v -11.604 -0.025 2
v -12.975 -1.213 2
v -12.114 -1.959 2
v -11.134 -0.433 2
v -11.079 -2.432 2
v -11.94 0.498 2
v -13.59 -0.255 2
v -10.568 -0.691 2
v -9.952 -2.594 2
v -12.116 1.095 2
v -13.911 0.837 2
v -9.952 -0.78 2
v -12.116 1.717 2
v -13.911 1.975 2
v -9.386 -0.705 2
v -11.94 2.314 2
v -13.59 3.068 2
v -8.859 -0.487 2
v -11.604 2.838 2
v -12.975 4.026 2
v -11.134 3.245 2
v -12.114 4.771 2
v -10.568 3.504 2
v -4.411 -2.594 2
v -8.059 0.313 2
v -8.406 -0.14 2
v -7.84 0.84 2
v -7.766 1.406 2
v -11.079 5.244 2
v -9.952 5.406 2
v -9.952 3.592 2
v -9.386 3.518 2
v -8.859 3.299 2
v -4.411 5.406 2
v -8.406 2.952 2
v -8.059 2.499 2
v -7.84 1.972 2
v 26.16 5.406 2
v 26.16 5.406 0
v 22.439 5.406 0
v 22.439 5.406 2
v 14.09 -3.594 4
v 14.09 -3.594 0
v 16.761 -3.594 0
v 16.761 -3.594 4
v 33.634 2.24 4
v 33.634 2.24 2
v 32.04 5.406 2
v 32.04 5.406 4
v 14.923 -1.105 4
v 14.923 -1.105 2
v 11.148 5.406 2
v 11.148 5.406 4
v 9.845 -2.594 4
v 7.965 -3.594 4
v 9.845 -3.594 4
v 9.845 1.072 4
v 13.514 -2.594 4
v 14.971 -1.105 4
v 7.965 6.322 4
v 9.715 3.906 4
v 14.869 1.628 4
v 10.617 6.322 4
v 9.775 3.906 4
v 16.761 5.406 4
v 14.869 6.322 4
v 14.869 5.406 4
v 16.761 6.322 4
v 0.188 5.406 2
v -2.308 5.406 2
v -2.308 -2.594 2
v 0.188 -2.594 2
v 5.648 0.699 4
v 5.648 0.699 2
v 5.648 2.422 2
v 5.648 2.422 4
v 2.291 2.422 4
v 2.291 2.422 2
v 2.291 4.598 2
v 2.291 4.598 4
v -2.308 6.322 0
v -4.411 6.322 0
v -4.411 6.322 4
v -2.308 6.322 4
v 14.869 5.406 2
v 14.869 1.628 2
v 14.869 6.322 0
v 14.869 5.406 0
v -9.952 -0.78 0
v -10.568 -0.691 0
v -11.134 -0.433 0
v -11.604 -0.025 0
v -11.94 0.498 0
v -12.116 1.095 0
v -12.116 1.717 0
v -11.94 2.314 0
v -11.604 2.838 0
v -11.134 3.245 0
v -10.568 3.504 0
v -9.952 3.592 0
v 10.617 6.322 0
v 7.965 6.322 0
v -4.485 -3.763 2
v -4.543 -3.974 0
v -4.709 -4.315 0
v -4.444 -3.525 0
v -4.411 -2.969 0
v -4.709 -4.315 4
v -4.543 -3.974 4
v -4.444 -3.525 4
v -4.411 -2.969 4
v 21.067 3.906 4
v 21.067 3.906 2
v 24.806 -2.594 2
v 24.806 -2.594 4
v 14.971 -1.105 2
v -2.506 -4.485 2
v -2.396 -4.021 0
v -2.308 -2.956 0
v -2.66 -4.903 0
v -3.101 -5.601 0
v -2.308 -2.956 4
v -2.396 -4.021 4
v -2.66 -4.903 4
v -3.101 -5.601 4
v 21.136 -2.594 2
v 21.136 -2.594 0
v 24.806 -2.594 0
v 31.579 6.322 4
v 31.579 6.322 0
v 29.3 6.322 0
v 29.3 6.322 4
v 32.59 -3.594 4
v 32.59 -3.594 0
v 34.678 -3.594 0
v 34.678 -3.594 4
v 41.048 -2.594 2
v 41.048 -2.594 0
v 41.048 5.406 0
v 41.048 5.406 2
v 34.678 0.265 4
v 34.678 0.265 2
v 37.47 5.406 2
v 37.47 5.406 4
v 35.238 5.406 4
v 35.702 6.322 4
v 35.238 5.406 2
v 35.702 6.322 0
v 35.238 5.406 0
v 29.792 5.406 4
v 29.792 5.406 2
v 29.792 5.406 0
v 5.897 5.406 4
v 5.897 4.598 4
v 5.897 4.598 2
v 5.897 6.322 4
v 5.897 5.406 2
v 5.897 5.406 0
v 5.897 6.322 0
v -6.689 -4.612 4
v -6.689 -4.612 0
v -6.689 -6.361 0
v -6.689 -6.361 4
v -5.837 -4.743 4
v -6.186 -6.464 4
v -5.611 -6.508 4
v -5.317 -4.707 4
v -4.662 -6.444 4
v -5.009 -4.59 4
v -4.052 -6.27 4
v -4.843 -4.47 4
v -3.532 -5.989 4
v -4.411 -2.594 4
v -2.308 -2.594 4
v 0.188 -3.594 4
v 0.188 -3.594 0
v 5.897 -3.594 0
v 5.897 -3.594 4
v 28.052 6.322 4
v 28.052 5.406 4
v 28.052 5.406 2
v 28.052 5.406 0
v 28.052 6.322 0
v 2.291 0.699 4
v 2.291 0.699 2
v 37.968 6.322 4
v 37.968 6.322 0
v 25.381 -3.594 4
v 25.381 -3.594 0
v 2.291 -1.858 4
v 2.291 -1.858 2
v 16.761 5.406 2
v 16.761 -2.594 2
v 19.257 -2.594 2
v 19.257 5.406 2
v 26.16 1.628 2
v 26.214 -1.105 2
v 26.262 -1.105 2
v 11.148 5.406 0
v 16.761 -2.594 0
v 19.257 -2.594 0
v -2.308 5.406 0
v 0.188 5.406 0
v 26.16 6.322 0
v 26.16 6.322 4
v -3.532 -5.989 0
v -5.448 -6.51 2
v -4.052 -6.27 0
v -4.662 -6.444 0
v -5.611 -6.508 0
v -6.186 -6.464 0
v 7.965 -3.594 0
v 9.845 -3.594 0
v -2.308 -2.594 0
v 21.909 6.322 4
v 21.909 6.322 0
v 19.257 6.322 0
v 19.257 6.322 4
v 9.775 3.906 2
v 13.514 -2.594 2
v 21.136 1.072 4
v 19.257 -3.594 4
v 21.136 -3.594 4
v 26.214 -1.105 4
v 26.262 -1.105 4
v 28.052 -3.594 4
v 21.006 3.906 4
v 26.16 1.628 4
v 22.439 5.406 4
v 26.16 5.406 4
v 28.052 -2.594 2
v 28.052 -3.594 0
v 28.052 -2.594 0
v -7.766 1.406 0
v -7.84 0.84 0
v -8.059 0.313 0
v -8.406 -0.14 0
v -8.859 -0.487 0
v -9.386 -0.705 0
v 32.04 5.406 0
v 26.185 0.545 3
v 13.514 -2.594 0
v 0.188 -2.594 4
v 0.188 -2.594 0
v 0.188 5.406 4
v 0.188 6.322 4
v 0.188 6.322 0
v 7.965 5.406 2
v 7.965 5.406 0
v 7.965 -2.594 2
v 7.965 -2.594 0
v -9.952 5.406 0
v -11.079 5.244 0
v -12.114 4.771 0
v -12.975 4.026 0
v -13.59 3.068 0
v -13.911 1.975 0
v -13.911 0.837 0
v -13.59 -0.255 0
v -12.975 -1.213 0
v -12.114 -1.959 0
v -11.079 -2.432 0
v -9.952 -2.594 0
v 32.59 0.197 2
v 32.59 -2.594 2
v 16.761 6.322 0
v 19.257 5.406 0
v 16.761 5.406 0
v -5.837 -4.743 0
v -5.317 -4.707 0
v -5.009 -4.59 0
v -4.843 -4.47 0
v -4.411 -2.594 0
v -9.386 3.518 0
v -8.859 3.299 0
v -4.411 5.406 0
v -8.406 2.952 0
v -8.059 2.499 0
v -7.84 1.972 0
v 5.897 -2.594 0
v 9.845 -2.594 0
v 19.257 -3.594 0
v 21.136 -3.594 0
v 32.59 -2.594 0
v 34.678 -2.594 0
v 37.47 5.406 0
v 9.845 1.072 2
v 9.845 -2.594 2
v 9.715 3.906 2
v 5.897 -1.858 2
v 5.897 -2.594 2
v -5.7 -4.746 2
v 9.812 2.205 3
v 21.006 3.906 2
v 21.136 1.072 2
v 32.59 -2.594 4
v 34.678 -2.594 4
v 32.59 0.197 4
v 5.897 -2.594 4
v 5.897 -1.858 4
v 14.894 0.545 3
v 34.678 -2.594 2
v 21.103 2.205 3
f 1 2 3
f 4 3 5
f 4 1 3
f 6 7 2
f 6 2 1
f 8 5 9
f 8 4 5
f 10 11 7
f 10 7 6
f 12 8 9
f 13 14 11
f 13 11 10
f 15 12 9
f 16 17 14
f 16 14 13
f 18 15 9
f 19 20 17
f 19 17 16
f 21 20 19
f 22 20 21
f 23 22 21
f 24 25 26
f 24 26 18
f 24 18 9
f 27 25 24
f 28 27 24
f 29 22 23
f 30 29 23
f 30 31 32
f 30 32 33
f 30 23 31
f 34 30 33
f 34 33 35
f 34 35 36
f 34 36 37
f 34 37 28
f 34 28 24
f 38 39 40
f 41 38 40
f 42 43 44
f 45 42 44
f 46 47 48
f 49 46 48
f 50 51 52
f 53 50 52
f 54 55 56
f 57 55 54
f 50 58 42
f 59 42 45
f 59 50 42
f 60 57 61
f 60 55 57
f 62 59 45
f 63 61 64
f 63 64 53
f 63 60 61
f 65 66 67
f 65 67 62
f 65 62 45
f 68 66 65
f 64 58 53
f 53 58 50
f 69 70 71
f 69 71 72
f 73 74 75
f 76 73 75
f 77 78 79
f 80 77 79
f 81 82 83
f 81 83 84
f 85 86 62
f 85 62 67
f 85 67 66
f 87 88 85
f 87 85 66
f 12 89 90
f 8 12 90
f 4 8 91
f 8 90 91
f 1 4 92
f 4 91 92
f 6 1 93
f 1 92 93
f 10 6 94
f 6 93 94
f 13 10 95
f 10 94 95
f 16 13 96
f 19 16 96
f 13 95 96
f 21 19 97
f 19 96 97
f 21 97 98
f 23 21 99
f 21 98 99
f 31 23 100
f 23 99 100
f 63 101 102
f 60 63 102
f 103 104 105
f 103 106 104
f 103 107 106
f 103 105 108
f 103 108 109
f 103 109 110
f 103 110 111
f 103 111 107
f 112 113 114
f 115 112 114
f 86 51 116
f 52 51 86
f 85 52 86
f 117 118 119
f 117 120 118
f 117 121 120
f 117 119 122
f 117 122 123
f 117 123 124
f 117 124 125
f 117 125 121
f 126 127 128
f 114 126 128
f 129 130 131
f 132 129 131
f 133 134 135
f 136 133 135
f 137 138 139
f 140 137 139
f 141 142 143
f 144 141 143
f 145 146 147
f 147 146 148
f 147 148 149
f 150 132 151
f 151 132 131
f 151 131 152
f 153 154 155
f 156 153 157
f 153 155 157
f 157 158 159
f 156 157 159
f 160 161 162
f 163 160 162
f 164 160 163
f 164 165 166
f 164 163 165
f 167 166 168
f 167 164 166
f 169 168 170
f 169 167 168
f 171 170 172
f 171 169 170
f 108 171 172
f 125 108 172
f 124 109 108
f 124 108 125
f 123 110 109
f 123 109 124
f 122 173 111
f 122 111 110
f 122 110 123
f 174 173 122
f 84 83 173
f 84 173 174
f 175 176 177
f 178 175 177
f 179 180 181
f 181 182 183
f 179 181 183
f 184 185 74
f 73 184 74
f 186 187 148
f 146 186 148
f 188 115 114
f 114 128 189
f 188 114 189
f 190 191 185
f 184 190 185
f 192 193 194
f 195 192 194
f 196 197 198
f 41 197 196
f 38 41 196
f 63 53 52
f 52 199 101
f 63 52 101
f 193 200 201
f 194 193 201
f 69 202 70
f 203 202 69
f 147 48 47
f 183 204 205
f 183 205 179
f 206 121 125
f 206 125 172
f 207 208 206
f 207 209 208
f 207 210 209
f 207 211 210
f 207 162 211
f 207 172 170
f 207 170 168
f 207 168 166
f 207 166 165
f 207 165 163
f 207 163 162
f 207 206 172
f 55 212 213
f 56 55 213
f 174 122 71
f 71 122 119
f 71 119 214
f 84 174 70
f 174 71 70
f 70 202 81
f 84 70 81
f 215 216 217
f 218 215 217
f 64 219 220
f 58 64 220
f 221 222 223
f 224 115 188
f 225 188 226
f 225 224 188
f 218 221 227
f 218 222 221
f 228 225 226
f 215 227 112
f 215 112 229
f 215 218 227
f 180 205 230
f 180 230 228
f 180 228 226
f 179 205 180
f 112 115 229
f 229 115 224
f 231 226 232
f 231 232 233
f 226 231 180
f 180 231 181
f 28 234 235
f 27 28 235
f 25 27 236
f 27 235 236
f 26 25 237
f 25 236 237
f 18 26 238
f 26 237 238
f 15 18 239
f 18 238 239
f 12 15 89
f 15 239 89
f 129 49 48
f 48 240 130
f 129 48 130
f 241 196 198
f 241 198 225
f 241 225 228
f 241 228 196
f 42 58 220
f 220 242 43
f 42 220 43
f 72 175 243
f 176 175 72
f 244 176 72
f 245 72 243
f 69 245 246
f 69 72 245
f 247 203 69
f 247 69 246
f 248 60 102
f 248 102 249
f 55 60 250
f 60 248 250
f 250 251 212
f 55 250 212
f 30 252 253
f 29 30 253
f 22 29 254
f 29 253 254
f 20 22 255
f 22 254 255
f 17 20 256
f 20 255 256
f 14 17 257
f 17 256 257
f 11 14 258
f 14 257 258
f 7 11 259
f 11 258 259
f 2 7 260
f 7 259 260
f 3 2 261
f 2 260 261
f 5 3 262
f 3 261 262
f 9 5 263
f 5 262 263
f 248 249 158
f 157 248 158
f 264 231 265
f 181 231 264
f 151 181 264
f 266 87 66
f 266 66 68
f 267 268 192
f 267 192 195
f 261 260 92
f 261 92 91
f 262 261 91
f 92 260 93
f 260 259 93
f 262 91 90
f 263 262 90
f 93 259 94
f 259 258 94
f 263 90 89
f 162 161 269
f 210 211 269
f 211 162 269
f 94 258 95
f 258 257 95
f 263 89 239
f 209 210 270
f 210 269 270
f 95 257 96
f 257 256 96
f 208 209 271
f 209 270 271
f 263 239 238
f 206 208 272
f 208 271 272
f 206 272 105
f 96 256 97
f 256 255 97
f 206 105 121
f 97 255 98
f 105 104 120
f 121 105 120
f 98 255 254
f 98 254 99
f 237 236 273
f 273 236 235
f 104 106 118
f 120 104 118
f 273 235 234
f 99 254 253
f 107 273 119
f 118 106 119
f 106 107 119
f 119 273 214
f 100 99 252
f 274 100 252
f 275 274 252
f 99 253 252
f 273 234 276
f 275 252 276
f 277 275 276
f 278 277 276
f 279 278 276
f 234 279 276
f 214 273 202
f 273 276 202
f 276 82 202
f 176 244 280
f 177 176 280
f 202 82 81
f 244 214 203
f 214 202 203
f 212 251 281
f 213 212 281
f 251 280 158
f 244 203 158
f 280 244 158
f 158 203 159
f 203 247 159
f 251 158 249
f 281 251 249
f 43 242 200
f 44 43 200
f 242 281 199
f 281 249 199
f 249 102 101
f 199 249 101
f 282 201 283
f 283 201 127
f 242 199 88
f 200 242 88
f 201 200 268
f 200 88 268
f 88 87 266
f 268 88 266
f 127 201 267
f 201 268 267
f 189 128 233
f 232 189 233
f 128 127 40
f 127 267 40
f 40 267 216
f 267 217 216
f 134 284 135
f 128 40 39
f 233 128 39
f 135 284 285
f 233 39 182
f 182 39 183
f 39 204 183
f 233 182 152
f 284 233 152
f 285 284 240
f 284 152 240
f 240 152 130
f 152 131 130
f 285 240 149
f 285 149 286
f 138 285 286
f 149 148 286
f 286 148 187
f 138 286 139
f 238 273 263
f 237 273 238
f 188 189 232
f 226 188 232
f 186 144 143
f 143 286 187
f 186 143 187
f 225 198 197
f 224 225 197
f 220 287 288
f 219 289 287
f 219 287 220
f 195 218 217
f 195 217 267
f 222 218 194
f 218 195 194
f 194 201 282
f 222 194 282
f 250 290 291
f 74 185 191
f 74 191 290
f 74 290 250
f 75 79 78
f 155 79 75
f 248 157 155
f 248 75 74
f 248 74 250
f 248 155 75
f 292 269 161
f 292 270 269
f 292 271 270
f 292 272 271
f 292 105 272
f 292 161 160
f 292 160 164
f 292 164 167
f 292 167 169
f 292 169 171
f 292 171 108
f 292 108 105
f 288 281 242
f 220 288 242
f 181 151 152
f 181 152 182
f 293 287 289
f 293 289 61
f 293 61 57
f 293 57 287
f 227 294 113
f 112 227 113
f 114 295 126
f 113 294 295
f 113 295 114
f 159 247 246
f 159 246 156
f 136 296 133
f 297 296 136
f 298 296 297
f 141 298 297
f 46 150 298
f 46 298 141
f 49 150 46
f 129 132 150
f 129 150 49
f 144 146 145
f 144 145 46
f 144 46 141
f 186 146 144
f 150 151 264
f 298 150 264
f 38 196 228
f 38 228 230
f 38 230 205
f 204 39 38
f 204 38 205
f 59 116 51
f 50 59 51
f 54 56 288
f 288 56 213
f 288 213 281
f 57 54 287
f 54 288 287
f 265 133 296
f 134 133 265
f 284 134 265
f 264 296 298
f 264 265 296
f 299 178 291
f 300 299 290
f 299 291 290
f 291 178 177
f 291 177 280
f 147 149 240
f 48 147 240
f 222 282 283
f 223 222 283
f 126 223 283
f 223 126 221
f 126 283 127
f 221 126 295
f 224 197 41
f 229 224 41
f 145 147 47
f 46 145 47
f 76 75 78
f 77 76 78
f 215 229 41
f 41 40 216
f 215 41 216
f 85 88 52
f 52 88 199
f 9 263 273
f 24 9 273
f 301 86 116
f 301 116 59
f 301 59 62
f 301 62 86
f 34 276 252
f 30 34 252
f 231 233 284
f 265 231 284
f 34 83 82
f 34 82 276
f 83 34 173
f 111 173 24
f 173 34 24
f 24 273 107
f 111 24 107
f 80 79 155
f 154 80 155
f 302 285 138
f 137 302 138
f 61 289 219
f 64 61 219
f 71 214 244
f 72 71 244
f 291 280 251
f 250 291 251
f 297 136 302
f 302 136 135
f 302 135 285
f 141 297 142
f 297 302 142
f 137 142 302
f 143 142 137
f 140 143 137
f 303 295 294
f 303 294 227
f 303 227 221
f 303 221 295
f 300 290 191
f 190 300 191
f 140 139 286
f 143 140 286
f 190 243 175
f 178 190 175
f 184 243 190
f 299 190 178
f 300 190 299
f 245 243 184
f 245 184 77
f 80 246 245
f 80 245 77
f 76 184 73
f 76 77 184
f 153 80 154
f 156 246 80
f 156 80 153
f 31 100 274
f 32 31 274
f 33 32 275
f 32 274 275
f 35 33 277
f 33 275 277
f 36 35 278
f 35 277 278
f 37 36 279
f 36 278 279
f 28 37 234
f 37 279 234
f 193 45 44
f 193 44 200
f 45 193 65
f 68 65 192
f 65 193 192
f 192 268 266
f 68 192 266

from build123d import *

# Parameters (mm, degrees)
F0_W     = 2.1028645833
F0_H     = 8
F0_H_2   = 0.9153645833
F1_DEPTH = 4
F0_W_2   = 5.7096354167
F0_H_3   = 1
F0_W_3   = 1.8793402778
F0_W_4   = 1.8923611111
F0_W_5   = 2.0876736111
F0_W_6   = 2.4956597222
F2_DEPTH = 2


with BuildPart() as f1:
    # F0 (on Top) → F1 (new body)
    with BuildSketch(Plane.XY):
        with Locations((-3.3594036534, 1.4062102847)):
            Rectangle(F0_W, F0_H)
        with Locations((-3.3594036534, 5.8638925763)):
            Rectangle(F0_W, F0_H_2)
        with BuildLine():
            Line((-2.3079713617, -2.5937897153), (-4.4108359451, -2.5937897153))
            Line((-4.4108359451, -2.5937897153), (-4.4108359451, -2.9687897153))
            add(Edge.make_bspline(
                [(-4.7092300423, -4.3153608959), (-4.4108359451, -3.8845883264), (-4.4108359451, -2.9687897153)],
                knots=[0, 0, 0, 1, 1, 1], degree=2))
            add(Edge.make_bspline(
                [(-5.6998984451, -4.7461334653), (-5.0076241395, -4.7461334653), (-4.7092300423, -4.3153608959)],
                knots=[0, 0, 0, 1, 1, 1], degree=2))
            add(Edge.make_bspline(
                [(-6.6894817784, -4.6115848542), (-6.1469470562, -4.7461334653), (-5.6998984451, -4.7461334653)],
                knots=[0, 0, 0, 1, 1, 1], degree=2))
            Line((-6.6894817784, -4.6115848542), (-6.6894817784, -6.3607167987))
            add(Edge.make_bspline(
                [(-5.448162334, -6.510456382), (-6.1599678895, -6.510456382), (-6.6894817784, -6.3607167987)],
                knots=[0, 0, 0, 1, 1, 1], degree=2))
            add(Edge.make_bspline(
                [(-3.1011571256, -5.6011681875), (-3.8943428895, -6.510456382), (-5.448162334, -6.510456382)],
                knots=[0, 0, 0, 1, 1, 1], degree=2))
            add(Edge.make_bspline(
                [(-2.3079713617, -2.955768882), (-2.3079713617, -4.6918799931), (-3.1011571256, -5.6011681875)],
                knots=[0, 0, 0, 1, 1, 1], degree=2))
            Line((-2.3079713617, -2.955768882), (-2.3079713617, -2.5937897153))
        make_face()
    extrude(amount=F1_DEPTH)



with BuildPart() as f1b:
    # F0 (on Top) → F1, piece 2 (new body)
    with BuildSketch(Plane.XY):
        with Locations((3.0425060688, -3.0937897153)):
            Rectangle(F0_W_2, F0_H_3)
        Polygon((5.8973237772, 5.4062102847), (0.1876883605, 5.4062102847), (0.1876883605, -2.5937897153), (5.8973237772, -2.5937897153), (5.8973237772, -1.8576786042), (2.2905529438, -1.8576786042), (2.2905529438, 0.6987450069), (5.6477578049, 0.6987450069), (5.6477578049, 2.4218352847), (2.2905529438, 2.4218352847), (2.2905529438, 4.5984845902), (5.8973237772, 4.5984845902), align=None)
        with Locations((3.0425060688, 5.8638925763)):
            Rectangle(F0_W_2, F0_H_2)
    extrude(amount=F1_DEPTH)


with BuildPart() as f1c:
    # F0 (on Top) → F1, piece 3 (new body)
    with BuildSketch(Plane.XY):
        Polygon((7.9654661383, 6.321574868), (7.9654661383, 5.4062102847), (11.1480840234, 5.4062102847), (10.6173758605, 6.321574868), align=None)
        with BuildLine():
            Line((11.1480840234, 5.4062102847), (7.9654661383, 5.4062102847))
            Line((7.9654661383, 5.4062102847), (7.9654661383, -2.5937897153))
            Line((7.9654661383, -2.5937897153), (9.844806416, -2.5937897153))
            Line((9.844806416, -2.5937897153), (9.844806416, 1.0720088958))
            add(Edge.make_bspline(
                [(9.7145980827, 3.9062102847), (9.844806416, 1.9205332013), (9.844806416, 1.0720088958)],
                knots=[0, 0, 0, 1, 1, 1], degree=2))
            Line((9.7145980827, 3.9062102847), (9.7753619716, 3.9062102847))
            Line((9.7753619716, 3.9062102847), (13.5143666012, -2.5937897153))
            Line((13.5143666012, -2.5937897153), (16.7610390549, -2.5937897153))
            Line((16.7610390549, -2.5937897153), (16.7610390549, 5.4062102847))
            Line((16.7610390549, 5.4062102847), (14.8686779438, 5.4062102847))
            Line((14.8686779438, 5.4062102847), (14.8686779438, 1.6275644513))
            add(Edge.make_bspline(
                [(14.9706744716, -1.1046404098), (14.8686779438, 0.8289533402), (14.8686779438, 1.6275644513)],
                knots=[0, 0, 0, 1, 1, 1], degree=2))
            Line((14.9706744716, -1.1046404098), (14.922931416, -1.1046404098))
            Line((14.922931416, -1.1046404098), (11.1480840234, 5.4062102847))
        make_face()
        with Locations((8.9051362772, -3.0937897153)):
            Rectangle(F0_W_3, F0_H_3)
        Polygon((16.7610390549, -2.5937897153), (13.5143666012, -2.5937897153), (14.0895980827, -3.5937897153), (16.7610390549, -3.5937897153), align=None)
        with Locations((15.8148584994, 5.8638925763)):
            Rectangle(F0_W_4, F0_H_2)
    extrude(amount=F1_DEPTH)


with BuildPart() as f1d:
    # F0 (on Top) → F1, piece 4 (new body)
    with BuildSketch(Plane.XY):
        Polygon((19.2566987772, 6.321574868), (19.2566987772, 5.4062102847), (22.4393166622, 5.4062102847), (21.9086084994, 6.321574868), align=None)
        with BuildLine():
            Line((22.4393166622, 5.4062102847), (19.2566987772, 5.4062102847))
            Line((19.2566987772, 5.4062102847), (19.2566987772, -2.5937897153))
            Line((19.2566987772, -2.5937897153), (21.1360390549, -2.5937897153))
            Line((21.1360390549, -2.5937897153), (21.1360390549, 1.0720088958))
            add(Edge.make_bspline(
                [(21.0058307216, 3.9062102847), (21.1360390549, 1.9205332013), (21.1360390549, 1.0720088958)],
                knots=[0, 0, 0, 1, 1, 1], degree=2))
            Line((21.0058307216, 3.9062102847), (21.0665946105, 3.9062102847))
            Line((21.0665946105, 3.9062102847), (24.8055992401, -2.5937897153))
            Line((24.8055992401, -2.5937897153), (28.0522716938, -2.5937897153))
            Line((28.0522716938, -2.5937897153), (28.0522716938, 5.4062102847))
            Line((28.0522716938, 5.4062102847), (26.1599105827, 5.4062102847))
            Line((26.1599105827, 5.4062102847), (26.1599105827, 1.6275644513))
            add(Edge.make_bspline(
                [(26.2619071105, -1.1046404098), (26.1599105827, 0.8289533402), (26.1599105827, 1.6275644513)],
                knots=[0, 0, 0, 1, 1, 1], degree=2))
            Line((26.2619071105, -1.1046404098), (26.2141640549, -1.1046404098))
            Line((26.2141640549, -1.1046404098), (22.4393166622, 5.4062102847))
        make_face()
        with Locations((27.1060911383, 5.8638925763)):
            Rectangle(F0_W_4, F0_H_2)
        Polygon((28.0522716938, -2.5937897153), (24.8055992401, -2.5937897153), (25.3808307216, -3.5937897153), (28.0522716938, -3.5937897153), align=None)
        with Locations((20.196368916, -3.0937897153)):
            Rectangle(F0_W_3, F0_H_3)
    extrude(amount=F1_DEPTH)


with BuildPart() as f1e:
    # F0 (on Top) → F1, piece 5 (new body)
    with BuildSketch(Plane.XY):
        with Locations((33.633868916, -3.0937897153)):
            Rectangle(F0_W_5, F0_H_3)
        Polygon((32.0395928218, 5.4062102847), (29.7918424154, 5.4062102847), (32.5900321105, 0.1974429236), (32.5900321105, -2.5937897153), (34.6777057216, -2.5937897153), (34.6777057216, 0.2647172291), (37.470433587, 5.4062102847), (35.2382460204, 5.4062102847), (33.633868916, 2.239543618), align=None)
        Polygon((29.3001015549, 6.321574868), (29.7918424154, 5.4062102847), (32.0395928218, 5.4062102847), (31.5787473883, 6.321574868), align=None)
        Polygon((35.7020112772, 6.321574868), (35.2382460204, 5.4062102847), (37.470433587, 5.4062102847), (37.9676362772, 6.321574868), align=None)
    extrude(amount=F1_DEPTH)


with BuildPart() as f1_1:
    add(f1.part)

    add(f1b.part)  # F2 merges F1b

    add(f1c.part)  # F2 merges F1c

    add(f1d.part)  # F2 merges F1d

    add(f1e.part)  # F2 merges F1e
    # F0 (on Top) → F2 (join)
    with BuildSketch(Plane.XY):
        with BuildLine():
            Line((-4.4108359451, 5.4062102847), (-9.9518112838, 5.4062102847))
            Line((-9.9518112838, 5.4062102847), (-9.9518112838, 3.5921949646))
            ThreePointArc((-9.9518112838, 3.5921949646), (-8.4060866931, 2.9519348754), (-7.7658266039, 1.4062102847))
            ThreePointArc((-7.7658266039, 1.4062102847), (-8.4060866931, -0.1395143061), (-9.9518112838, -0.7797743953))
            Line((-9.9518112838, -0.7797743953), (-9.9518112838, -2.5937897153))
            Line((-9.9518112838, -2.5937897153), (-4.4108359451, -2.5937897153))
            Line((-4.4108359451, -2.5937897153), (-4.4108359451, 5.4062102847))
        make_face()
        with BuildLine():
            Line((-9.9518112838, 3.5921949646), (-9.9518112838, 5.4062102847))
            ThreePointArc((-9.9518112838, 5.4062102847), (-13.9518112838, 1.4062102847), (-9.9518112838, -2.5937897153))
            Line((-9.9518112838, -2.5937897153), (-9.9518112838, -0.7797743953))
            ThreePointArc((-9.9518112838, -0.7797743953), (-12.1377959638, 1.4062102847), (-9.9518112838, 3.5921949646))
        make_face()
        with Locations((-3.3594036534, 5.8638925763)):
            Rectangle(F0_W, F0_H_2)
        with Locations((-3.3594036534, 1.4062102847)):
            Rectangle(F0_W, F0_H)
        with Locations((-1.0601415006, 1.4062102847)):
            Rectangle(F0_W_6, F0_H)
        with BuildLine():
            Line((-2.3079713617, -2.5937897153), (-4.4108359451, -2.5937897153))
            Line((-4.4108359451, -2.5937897153), (-4.4108359451, -2.9687897153))
            add(Edge.make_bspline(
                [(-4.7092300423, -4.3153608959), (-4.4108359451, -3.8845883264), (-4.4108359451, -2.9687897153)],
                knots=[0, 0, 0, 1, 1, 1], degree=2))
            add(Edge.make_bspline(
                [(-5.6998984451, -4.7461334653), (-5.0076241395, -4.7461334653), (-4.7092300423, -4.3153608959)],
                knots=[0, 0, 0, 1, 1, 1], degree=2))
            add(Edge.make_bspline(
                [(-6.6894817784, -4.6115848542), (-6.1469470562, -4.7461334653), (-5.6998984451, -4.7461334653)],
                knots=[0, 0, 0, 1, 1, 1], degree=2))
            Line((-6.6894817784, -4.6115848542), (-6.6894817784, -6.3607167987))
            add(Edge.make_bspline(
                [(-5.448162334, -6.510456382), (-6.1599678895, -6.510456382), (-6.6894817784, -6.3607167987)],
                knots=[0, 0, 0, 1, 1, 1], degree=2))
            add(Edge.make_bspline(
                [(-3.1011571256, -5.6011681875), (-3.8943428895, -6.510456382), (-5.448162334, -6.510456382)],
                knots=[0, 0, 0, 1, 1, 1], degree=2))
            add(Edge.make_bspline(
                [(-2.3079713617, -2.955768882), (-2.3079713617, -4.6918799931), (-3.1011571256, -5.6011681875)],
                knots=[0, 0, 0, 1, 1, 1], degree=2))
            Line((-2.3079713617, -2.955768882), (-2.3079713617, -2.5937897153))
        make_face()
        with Locations((3.0425060688, 5.8638925763)):
            Rectangle(F0_W_2, F0_H_2)
        Polygon((5.8973237772, 5.4062102847), (0.1876883605, 5.4062102847), (0.1876883605, -2.5937897153), (5.8973237772, -2.5937897153), (5.8973237772, -1.8576786042), (2.2905529438, -1.8576786042), (2.2905529438, 0.6987450069), (5.6477578049, 0.6987450069), (5.6477578049, 2.4218352847), (2.2905529438, 2.4218352847), (2.2905529438, 4.5984845902), (5.8973237772, 4.5984845902), align=None)
        Polygon((7.9654661383, 5.4062102847), (5.8973237772, 5.4062102847), (5.8973237772, 4.5984845902), (2.2905529438, 4.5984845902), (2.2905529438, 2.4218352847), (5.6477578049, 2.4218352847), (5.6477578049, 0.6987450069), (2.2905529438, 0.6987450069), (2.2905529438, -1.8576786042), (5.8973237772, -1.8576786042), (5.8973237772, -2.5937897153), (7.9654661383, -2.5937897153), align=None)
        with Locations((3.0425060688, -3.0937897153)):
            Rectangle(F0_W_2, F0_H_3)
        Polygon((7.9654661383, 6.321574868), (7.9654661383, 5.4062102847), (11.1480840234, 5.4062102847), (10.6173758605, 6.321574868), align=None)
        with BuildLine():
            Line((11.1480840234, 5.4062102847), (7.9654661383, 5.4062102847))
            Line((7.9654661383, 5.4062102847), (7.9654661383, -2.5937897153))
            Line((7.9654661383, -2.5937897153), (9.844806416, -2.5937897153))
            Line((9.844806416, -2.5937897153), (9.844806416, 1.0720088958))
            add(Edge.make_bspline(
                [(9.7145980827, 3.9062102847), (9.844806416, 1.9205332013), (9.844806416, 1.0720088958)],
                knots=[0, 0, 0, 1, 1, 1], degree=2))
            Line((9.7145980827, 3.9062102847), (9.7753619716, 3.9062102847))
            Line((9.7753619716, 3.9062102847), (13.5143666012, -2.5937897153))
            Line((13.5143666012, -2.5937897153), (16.7610390549, -2.5937897153))
            Line((16.7610390549, -2.5937897153), (16.7610390549, 5.4062102847))
            Line((16.7610390549, 5.4062102847), (14.8686779438, 5.4062102847))
            Line((14.8686779438, 5.4062102847), (14.8686779438, 1.6275644513))
            add(Edge.make_bspline(
                [(14.9706744716, -1.1046404098), (14.8686779438, 0.8289533402), (14.8686779438, 1.6275644513)],
                knots=[0, 0, 0, 1, 1, 1], degree=2))
            Line((14.9706744716, -1.1046404098), (14.922931416, -1.1046404098))
            Line((14.922931416, -1.1046404098), (11.1480840234, 5.4062102847))
        make_face()
        with BuildLine():
            Line((14.8686779438, 5.4062102847), (11.1480840234, 5.4062102847))
            Line((11.1480840234, 5.4062102847), (14.922931416, -1.1046404098))
            Line((14.922931416, -1.1046404098), (14.9706744716, -1.1046404098))
            add(Edge.make_bspline(
                [(14.9706744716, -1.1046404098), (14.8686779438, 0.8289533402), (14.8686779438, 1.6275644513)],
                knots=[0, 0, 0, 1, 1, 1], degree=2))
            Line((14.8686779438, 1.6275644513), (14.8686779438, 5.4062102847))
        make_face()
        with Locations((8.9051362772, -3.0937897153)):
            Rectangle(F0_W_3, F0_H_3)
        with Locations((15.8148584994, 5.8638925763)):
            Rectangle(F0_W_4, F0_H_2)
        with BuildLine():
            Line((9.844806416, 1.0720088958), (9.844806416, -2.5937897153))
            Line((9.844806416, -2.5937897153), (13.5143666012, -2.5937897153))
            Line((13.5143666012, -2.5937897153), (9.7753619716, 3.9062102847))
            Line((9.7753619716, 3.9062102847), (9.7145980827, 3.9062102847))
            add(Edge.make_bspline(
                [(9.7145980827, 3.9062102847), (9.844806416, 1.9205332013), (9.844806416, 1.0720088958)],
                knots=[0, 0, 0, 1, 1, 1], degree=2))
        make_face()
        with Locations((18.008868916, 1.4062102847)):
            Rectangle(F0_W_6, F0_H)
        Polygon((16.7610390549, -2.5937897153), (13.5143666012, -2.5937897153), (14.0895980827, -3.5937897153), (16.7610390549, -3.5937897153), align=None)
        Polygon((19.2566987772, 6.321574868), (19.2566987772, 5.4062102847), (22.4393166622, 5.4062102847), (21.9086084994, 6.321574868), align=None)
        with BuildLine():
            Line((22.4393166622, 5.4062102847), (19.2566987772, 5.4062102847))
            Line((19.2566987772, 5.4062102847), (19.2566987772, -2.5937897153))
            Line((19.2566987772, -2.5937897153), (21.1360390549, -2.5937897153))
            Line((21.1360390549, -2.5937897153), (21.1360390549, 1.0720088958))
            add(Edge.make_bspline(
                [(21.0058307216, 3.9062102847), (21.1360390549, 1.9205332013), (21.1360390549, 1.0720088958)],
                knots=[0, 0, 0, 1, 1, 1], degree=2))
            Line((21.0058307216, 3.9062102847), (21.0665946105, 3.9062102847))
            Line((21.0665946105, 3.9062102847), (24.8055992401, -2.5937897153))
            Line((24.8055992401, -2.5937897153), (28.0522716938, -2.5937897153))
            Line((28.0522716938, -2.5937897153), (28.0522716938, 5.4062102847))
            Line((28.0522716938, 5.4062102847), (26.1599105827, 5.4062102847))
            Line((26.1599105827, 5.4062102847), (26.1599105827, 1.6275644513))
            add(Edge.make_bspline(
                [(26.2619071105, -1.1046404098), (26.1599105827, 0.8289533402), (26.1599105827, 1.6275644513)],
                knots=[0, 0, 0, 1, 1, 1], degree=2))
            Line((26.2619071105, -1.1046404098), (26.2141640549, -1.1046404098))
            Line((26.2141640549, -1.1046404098), (22.4393166622, 5.4062102847))
        make_face()
        with BuildLine():
            Line((26.1599105827, 5.4062102847), (22.4393166622, 5.4062102847))
            Line((22.4393166622, 5.4062102847), (26.2141640549, -1.1046404098))
            Line((26.2141640549, -1.1046404098), (26.2619071105, -1.1046404098))
            add(Edge.make_bspline(
                [(26.2619071105, -1.1046404098), (26.1599105827, 0.8289533402), (26.1599105827, 1.6275644513)],
                knots=[0, 0, 0, 1, 1, 1], degree=2))
            Line((26.1599105827, 1.6275644513), (26.1599105827, 5.4062102847))
        make_face()
        with Locations((20.196368916, -3.0937897153)):
            Rectangle(F0_W_3, F0_H_3)
        with Locations((27.1060911383, 5.8638925763)):
            Rectangle(F0_W_4, F0_H_2)
        with BuildLine():
            Line((21.1360390549, 1.0720088958), (21.1360390549, -2.5937897153))
            Line((21.1360390549, -2.5937897153), (24.8055992401, -2.5937897153))
            Line((24.8055992401, -2.5937897153), (21.0665946105, 3.9062102847))
            Line((21.0665946105, 3.9062102847), (21.0058307216, 3.9062102847))
            add(Edge.make_bspline(
                [(21.0058307216, 3.9062102847), (21.1360390549, 1.9205332013), (21.1360390549, 1.0720088958)],
                knots=[0, 0, 0, 1, 1, 1], degree=2))
        make_face()
        Polygon((29.7918424154, 5.4062102847), (28.0522716938, 5.4062102847), (28.0522716938, -2.5937897153), (32.5900321105, -2.5937897153), (32.5900321105, 0.1974429236), align=None)
        Polygon((28.0522716938, -2.5937897153), (24.8055992401, -2.5937897153), (25.3808307216, -3.5937897153), (28.0522716938, -3.5937897153), align=None)
        Polygon((29.3001015549, 6.321574868), (29.7918424154, 5.4062102847), (32.0395928218, 5.4062102847), (31.5787473883, 6.321574868), align=None)
        Polygon((32.0395928218, 5.4062102847), (29.7918424154, 5.4062102847), (32.5900321105, 0.1974429236), (32.5900321105, -2.5937897153), (34.6777057216, -2.5937897153), (34.6777057216, 0.2647172291), (37.470433587, 5.4062102847), (35.2382460204, 5.4062102847), (33.633868916, 2.239543618), align=None)
        Polygon((35.2382460204, 5.4062102847), (32.0395928218, 5.4062102847), (33.633868916, 2.239543618), align=None)
        with Locations((33.633868916, -3.0937897153)):
            Rectangle(F0_W_5, F0_H_3)
        Polygon((35.7020112772, 6.321574868), (35.2382460204, 5.4062102847), (37.470433587, 5.4062102847), (37.9676362772, 6.321574868), align=None)
        Polygon((34.6777057216, 0.2647172291), (34.6777057216, -2.5937897153), (41.0481887162, -2.5937897153), (41.0481887162, 5.4062102847), (37.470433587, 5.4062102847), align=None)
    extrude(amount=F2_DEPTH)


solid = f1_1.part
